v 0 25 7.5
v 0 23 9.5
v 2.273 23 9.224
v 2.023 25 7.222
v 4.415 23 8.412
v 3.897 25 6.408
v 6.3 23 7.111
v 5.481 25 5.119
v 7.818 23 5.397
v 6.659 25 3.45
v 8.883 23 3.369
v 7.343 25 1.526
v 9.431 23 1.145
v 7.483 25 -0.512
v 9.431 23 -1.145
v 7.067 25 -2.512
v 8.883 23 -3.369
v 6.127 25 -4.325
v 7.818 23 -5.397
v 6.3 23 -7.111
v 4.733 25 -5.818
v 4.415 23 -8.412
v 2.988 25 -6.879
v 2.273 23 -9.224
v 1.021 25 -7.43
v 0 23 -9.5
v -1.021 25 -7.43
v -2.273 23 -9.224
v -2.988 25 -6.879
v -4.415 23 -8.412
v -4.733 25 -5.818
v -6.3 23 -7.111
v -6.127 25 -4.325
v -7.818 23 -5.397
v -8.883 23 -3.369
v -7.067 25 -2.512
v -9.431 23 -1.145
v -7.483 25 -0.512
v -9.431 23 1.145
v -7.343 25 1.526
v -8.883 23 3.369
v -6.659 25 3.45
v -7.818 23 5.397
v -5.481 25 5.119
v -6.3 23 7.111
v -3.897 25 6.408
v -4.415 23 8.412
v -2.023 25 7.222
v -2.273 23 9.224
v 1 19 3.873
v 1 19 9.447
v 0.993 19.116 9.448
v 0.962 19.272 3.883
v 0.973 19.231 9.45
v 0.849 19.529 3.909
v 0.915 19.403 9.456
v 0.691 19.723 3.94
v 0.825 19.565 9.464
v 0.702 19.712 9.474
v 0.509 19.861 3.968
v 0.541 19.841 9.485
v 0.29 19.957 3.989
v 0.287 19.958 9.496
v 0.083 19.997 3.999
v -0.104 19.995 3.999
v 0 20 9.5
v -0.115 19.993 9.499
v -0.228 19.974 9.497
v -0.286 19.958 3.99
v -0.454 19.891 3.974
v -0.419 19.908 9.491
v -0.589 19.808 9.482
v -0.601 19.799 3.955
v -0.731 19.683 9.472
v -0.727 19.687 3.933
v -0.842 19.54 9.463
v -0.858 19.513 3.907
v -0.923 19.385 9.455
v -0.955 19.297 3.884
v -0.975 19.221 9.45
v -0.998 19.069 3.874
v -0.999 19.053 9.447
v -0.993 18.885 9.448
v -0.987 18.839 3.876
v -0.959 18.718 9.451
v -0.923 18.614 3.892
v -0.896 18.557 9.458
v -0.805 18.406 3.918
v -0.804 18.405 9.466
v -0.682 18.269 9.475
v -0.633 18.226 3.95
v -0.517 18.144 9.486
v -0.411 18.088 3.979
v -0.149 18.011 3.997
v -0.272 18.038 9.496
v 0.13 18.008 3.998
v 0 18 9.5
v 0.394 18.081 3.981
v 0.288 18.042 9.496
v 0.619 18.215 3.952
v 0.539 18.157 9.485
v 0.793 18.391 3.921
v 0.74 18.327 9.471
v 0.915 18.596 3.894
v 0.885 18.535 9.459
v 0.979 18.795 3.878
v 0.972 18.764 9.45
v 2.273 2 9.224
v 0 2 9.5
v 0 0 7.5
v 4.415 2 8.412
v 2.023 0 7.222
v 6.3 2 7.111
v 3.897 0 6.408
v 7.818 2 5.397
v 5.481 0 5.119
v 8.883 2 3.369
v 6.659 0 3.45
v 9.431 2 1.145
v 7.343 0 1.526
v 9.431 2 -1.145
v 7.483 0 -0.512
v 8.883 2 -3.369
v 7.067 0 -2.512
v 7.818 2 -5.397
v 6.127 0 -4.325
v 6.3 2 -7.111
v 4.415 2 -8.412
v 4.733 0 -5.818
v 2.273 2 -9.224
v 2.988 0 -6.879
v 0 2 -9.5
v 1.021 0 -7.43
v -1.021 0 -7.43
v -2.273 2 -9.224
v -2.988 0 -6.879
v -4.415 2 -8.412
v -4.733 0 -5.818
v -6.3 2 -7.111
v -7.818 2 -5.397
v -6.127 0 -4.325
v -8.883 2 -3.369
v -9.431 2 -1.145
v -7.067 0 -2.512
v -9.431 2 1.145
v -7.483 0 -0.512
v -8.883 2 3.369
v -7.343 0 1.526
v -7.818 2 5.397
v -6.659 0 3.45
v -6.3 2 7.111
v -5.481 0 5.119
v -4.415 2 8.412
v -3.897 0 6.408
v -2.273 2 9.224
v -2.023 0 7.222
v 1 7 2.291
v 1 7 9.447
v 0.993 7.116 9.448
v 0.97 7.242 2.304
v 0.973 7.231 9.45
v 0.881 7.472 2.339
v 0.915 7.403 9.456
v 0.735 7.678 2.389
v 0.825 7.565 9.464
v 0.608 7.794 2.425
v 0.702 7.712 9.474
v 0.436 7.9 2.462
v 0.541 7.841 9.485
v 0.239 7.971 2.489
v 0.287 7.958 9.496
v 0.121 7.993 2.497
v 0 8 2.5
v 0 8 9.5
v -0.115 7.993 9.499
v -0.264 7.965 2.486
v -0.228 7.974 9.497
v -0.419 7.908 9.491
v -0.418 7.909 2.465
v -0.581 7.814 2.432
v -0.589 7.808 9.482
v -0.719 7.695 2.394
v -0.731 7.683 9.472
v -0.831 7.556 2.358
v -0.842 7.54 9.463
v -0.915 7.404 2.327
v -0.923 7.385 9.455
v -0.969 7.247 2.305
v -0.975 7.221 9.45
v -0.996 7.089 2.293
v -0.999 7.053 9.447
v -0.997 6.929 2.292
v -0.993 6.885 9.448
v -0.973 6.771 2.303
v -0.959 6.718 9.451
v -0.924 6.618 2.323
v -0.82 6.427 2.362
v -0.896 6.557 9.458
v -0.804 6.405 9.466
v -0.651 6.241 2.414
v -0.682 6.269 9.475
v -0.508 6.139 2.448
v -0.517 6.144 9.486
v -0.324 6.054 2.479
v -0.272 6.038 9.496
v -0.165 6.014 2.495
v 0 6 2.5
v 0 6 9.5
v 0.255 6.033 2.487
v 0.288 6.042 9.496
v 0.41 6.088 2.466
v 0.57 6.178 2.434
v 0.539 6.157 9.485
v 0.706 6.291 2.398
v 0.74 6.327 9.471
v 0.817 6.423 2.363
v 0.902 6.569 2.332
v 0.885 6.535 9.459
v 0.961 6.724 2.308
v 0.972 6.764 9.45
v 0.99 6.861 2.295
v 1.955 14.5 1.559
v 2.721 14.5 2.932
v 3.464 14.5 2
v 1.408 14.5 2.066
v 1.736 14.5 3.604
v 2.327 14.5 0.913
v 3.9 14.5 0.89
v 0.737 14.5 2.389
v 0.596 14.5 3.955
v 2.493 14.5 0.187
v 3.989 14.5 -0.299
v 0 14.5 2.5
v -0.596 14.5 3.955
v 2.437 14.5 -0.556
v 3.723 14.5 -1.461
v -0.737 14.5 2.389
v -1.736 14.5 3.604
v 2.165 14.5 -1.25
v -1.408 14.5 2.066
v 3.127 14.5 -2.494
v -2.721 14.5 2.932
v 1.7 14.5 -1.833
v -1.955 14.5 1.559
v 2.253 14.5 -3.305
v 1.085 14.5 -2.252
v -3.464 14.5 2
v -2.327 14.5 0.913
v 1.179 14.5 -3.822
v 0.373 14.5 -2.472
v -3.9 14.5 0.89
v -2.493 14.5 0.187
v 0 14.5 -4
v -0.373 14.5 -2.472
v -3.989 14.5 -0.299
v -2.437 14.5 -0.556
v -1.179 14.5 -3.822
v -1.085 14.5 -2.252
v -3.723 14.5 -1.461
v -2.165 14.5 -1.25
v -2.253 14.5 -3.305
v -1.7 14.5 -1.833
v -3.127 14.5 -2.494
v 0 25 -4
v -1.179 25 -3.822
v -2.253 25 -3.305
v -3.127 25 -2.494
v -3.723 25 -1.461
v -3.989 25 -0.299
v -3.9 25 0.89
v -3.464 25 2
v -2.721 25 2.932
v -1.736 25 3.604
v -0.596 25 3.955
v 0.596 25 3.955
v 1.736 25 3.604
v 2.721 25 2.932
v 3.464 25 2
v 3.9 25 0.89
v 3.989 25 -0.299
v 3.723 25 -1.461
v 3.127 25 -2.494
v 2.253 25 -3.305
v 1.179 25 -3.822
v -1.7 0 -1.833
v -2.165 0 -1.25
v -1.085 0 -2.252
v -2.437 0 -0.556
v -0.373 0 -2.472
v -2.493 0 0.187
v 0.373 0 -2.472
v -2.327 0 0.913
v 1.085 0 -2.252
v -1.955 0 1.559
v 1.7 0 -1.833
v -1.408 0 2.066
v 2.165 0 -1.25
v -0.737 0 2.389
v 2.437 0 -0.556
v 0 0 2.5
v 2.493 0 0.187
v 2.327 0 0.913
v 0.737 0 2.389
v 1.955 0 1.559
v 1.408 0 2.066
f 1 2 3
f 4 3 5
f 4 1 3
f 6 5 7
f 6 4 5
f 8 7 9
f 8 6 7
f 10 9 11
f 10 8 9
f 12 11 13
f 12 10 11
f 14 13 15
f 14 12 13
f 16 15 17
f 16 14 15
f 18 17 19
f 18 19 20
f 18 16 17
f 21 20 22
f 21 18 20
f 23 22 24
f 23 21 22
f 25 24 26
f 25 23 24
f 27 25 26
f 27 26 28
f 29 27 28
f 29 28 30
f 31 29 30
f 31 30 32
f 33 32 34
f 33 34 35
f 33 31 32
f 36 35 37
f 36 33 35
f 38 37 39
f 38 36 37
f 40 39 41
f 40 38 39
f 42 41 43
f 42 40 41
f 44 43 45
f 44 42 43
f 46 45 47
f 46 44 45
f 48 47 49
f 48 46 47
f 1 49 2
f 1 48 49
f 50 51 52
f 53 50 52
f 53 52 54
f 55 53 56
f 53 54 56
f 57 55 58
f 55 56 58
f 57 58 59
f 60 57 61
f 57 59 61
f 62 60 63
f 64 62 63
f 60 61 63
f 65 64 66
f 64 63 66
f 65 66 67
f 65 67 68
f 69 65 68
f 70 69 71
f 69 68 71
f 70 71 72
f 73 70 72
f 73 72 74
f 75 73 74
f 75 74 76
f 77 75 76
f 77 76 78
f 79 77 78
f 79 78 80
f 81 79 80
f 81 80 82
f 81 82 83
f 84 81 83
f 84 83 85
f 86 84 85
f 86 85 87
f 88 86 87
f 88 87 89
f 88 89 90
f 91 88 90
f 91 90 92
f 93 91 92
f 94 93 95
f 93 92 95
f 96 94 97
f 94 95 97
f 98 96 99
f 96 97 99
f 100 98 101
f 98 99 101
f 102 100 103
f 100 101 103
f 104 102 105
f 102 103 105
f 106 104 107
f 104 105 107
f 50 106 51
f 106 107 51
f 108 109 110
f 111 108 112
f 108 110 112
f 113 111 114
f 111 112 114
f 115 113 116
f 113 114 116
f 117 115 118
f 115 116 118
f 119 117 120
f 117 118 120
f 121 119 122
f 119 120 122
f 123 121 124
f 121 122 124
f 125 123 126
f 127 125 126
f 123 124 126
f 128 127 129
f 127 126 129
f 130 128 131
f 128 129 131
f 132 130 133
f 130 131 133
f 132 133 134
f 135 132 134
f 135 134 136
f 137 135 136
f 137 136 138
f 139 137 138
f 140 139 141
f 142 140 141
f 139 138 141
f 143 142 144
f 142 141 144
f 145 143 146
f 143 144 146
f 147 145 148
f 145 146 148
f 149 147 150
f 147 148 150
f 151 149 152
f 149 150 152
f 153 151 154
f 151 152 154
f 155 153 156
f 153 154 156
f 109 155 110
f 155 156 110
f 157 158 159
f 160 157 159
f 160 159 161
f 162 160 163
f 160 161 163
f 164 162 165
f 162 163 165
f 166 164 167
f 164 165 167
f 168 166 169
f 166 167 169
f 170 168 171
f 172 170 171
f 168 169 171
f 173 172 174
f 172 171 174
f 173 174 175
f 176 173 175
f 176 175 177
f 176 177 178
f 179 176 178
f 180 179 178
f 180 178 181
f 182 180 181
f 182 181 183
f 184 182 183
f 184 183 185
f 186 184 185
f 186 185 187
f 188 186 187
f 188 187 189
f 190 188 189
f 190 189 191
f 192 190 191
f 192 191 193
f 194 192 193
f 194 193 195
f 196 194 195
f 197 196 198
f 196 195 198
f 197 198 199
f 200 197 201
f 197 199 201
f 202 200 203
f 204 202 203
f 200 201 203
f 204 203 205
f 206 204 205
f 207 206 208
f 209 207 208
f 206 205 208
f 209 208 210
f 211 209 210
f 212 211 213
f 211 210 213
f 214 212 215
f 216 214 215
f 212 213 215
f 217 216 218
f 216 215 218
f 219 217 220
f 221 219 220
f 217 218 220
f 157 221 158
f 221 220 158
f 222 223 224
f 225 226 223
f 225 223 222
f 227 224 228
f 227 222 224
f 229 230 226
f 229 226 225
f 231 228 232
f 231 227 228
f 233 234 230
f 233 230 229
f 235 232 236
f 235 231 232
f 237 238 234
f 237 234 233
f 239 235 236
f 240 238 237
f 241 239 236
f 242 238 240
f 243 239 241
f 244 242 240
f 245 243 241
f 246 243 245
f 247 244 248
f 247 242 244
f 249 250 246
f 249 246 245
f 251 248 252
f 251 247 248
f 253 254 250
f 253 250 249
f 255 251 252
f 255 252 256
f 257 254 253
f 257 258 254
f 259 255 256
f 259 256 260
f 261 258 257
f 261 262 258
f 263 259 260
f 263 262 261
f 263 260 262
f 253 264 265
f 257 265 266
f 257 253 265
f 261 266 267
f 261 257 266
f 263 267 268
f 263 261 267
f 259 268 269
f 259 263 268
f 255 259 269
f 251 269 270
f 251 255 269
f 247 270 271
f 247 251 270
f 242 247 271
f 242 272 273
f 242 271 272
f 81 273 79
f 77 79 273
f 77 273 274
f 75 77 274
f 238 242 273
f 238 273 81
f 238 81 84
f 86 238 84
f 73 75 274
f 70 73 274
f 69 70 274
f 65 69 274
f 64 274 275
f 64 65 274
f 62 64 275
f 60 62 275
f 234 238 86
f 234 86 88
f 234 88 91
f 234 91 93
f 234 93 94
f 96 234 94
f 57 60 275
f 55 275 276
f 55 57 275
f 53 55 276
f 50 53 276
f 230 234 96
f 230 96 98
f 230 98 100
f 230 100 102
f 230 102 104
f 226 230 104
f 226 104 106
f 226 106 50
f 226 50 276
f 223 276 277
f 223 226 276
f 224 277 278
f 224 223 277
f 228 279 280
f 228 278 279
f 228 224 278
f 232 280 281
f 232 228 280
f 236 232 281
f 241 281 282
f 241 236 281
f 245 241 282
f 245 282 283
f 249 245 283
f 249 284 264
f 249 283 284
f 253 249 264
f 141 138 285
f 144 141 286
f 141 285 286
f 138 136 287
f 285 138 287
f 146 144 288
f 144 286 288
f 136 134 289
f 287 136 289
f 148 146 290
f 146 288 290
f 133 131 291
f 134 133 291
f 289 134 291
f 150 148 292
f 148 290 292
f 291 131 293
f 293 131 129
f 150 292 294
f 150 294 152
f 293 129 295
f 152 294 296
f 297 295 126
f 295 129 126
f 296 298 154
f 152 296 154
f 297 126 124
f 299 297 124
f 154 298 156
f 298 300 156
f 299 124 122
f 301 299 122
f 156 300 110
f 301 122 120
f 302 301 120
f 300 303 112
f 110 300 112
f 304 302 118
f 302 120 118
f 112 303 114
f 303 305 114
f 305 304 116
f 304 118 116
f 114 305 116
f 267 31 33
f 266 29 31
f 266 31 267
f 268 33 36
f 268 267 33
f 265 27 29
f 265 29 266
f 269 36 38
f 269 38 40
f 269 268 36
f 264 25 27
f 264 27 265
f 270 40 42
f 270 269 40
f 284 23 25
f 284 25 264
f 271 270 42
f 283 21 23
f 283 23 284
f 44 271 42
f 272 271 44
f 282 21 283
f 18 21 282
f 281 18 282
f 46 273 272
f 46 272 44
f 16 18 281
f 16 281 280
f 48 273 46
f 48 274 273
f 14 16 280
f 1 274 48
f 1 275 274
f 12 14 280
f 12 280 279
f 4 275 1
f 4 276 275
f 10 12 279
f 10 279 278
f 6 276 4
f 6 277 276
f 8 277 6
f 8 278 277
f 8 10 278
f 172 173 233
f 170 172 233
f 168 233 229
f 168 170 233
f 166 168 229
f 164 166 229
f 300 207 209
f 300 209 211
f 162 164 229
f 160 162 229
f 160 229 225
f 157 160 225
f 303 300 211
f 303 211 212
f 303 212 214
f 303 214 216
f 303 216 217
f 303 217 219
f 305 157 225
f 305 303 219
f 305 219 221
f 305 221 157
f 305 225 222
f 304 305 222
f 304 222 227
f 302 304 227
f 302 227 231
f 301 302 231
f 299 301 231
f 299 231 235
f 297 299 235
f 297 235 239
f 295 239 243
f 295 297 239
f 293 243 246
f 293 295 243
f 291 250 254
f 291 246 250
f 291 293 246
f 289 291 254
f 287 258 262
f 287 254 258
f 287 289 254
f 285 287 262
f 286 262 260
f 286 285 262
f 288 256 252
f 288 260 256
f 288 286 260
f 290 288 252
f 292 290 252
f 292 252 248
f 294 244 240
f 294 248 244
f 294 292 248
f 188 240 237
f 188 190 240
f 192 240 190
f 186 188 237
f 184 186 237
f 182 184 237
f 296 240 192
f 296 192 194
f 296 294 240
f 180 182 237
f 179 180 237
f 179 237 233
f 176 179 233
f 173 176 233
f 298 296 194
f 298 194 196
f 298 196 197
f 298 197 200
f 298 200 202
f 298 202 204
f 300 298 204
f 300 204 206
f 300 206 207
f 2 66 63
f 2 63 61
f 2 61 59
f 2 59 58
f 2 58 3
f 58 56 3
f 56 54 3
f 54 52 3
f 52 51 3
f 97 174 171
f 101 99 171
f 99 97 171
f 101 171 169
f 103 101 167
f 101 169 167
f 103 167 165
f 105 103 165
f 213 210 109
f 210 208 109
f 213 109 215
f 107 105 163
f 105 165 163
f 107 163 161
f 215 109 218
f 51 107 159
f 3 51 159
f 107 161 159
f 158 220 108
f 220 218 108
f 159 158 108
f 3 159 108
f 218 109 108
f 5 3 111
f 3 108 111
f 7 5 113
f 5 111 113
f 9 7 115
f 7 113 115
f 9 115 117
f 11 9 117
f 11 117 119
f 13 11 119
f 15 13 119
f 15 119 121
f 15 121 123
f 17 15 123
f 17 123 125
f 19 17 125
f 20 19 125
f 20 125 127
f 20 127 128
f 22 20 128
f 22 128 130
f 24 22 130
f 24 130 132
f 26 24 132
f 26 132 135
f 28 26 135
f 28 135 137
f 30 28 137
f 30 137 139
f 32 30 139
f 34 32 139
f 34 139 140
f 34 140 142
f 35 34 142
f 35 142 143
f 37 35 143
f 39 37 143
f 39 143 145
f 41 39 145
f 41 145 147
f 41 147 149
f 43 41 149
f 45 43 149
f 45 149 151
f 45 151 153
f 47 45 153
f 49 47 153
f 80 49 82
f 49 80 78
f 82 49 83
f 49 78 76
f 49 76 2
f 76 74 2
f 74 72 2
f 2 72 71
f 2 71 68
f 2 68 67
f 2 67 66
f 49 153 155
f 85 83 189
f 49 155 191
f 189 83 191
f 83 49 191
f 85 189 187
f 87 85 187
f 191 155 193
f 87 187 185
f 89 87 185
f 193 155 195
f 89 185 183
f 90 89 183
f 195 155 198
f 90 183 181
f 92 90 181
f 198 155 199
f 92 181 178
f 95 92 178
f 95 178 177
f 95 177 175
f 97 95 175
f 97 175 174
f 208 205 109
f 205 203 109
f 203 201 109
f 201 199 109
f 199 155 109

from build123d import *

# Parameters (mm, degrees)
SKETCH1_R           = 9.5
BOSS_EXTRUDE1_DEPTH = 25
SKETCH2_R           = 2.5
CUT_EXTRUDE1_DEPTH  = 15
SKETCH3_R           = 4
CUT_EXTRUDE2_DEPTH  = 20.767397401
CHAMFER1_SIZE       = 2
CUT_EXTRUDE3_REACH  = 34.806
SKETCH13_R          = 1


with BuildPart() as part:
    # Sketch1 → Boss-Extrude1 (new body)
    with BuildSketch(Plane(origin=(0, 0, 0), x_dir=(1, 0, 0), z_dir=(0, 1, 0))):
        with Locations(Location((0, 0, 0), (0, 0, 270))):
            Circle(SKETCH1_R)
    extrude(amount=BOSS_EXTRUDE1_DEPTH)

    # Sketch2 → Cut-Extrude1 (cut)
    with BuildSketch(Plane(origin=(0, 0, 0), x_dir=(1, 0, 0), z_dir=(0, 1, 0))):
        with Locations(Location((0, 0, 0), (0, 0, 270))):
            Circle(SKETCH2_R)
    extrude(amount=CUT_EXTRUDE1_DEPTH, mode=Mode.SUBTRACT)

    # Sketch3 → Cut-Extrude2 (cut, through all)
    with BuildSketch(Plane(origin=(0, 14.5, 0), x_dir=(1, 0, 0), z_dir=(0, 1, 0))):
        with Locations(Location((0, 0, 0), (0, 0, 90))):
            Circle(SKETCH3_R)
    extrude(amount=CUT_EXTRUDE2_DEPTH, mode=Mode.SUBTRACT)

    # Chamfer1
    chamfer1_edges = [part.edges().sort_by_distance(p)[0] for p in [
        (0, 0, -9.5),
        (0, 25, -9.5),
    ]]
    chamfer(chamfer1_edges, length=CHAMFER1_SIZE)

    # Sketch13 → Cut-Extrude3 (cut, up to next)
    with BuildSketch(Plane.XY.offset(9.5), mode=Mode.PRIVATE) as cut_extrude3_sk1:
        with Locations((0, 19)):
            Circle(SKETCH13_R)
    cut_extrude3_tool1 = extrude(cut_extrude3_sk1.sketch, amount=-CUT_EXTRUDE3_REACH, mode=Mode.PRIVATE) & part.part
    # Sketch13 → Cut-Extrude3 (cut, up to next)
    with BuildSketch(Plane.XY.offset(9.5), mode=Mode.PRIVATE) as cut_extrude3_sk2:
        with Locations((0, 7)):
            Circle(SKETCH13_R)
    cut_extrude3_tool2 = extrude(cut_extrude3_sk2.sketch, amount=-CUT_EXTRUDE3_REACH, mode=Mode.PRIVATE) & part.part
    add(cut_extrude3_tool1.solids().sort_by_distance((0, 19, 9.5))[0], mode=Mode.SUBTRACT)
    add(cut_extrude3_tool2.solids().sort_by_distance((0, 7, 9.5))[0], mode=Mode.SUBTRACT)


solid = part.part
